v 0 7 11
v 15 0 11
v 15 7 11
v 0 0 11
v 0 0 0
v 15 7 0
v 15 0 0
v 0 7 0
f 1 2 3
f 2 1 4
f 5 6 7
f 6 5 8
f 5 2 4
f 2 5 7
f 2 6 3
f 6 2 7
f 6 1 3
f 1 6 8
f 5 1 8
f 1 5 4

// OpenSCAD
// Generated by SolidPython 1.0.1 on 2020-07-29 00:46:55


cube(size = [15, 7, 11]);
/***********************************************
*********      SolidPython code:      **********
************************************************
 
# import packages: SolidPython
from solid import *
from solid.utils import *
from itertools import chain, combinations, permutations


class Resize:

    def __init__(self, scad_file):
        self.scad_file = scad_file
        #self.scad_file = import_scad(scad_file)
        # cone/cylinder param:
        self.r1 = 0
        self.r2 = 0
        self.h = 0
        # rectangular prism param:
        self.w = 0
        self.l = 0
        # ellipse param:
        self.r = 0

    # import OpenScad code (file name corresponds to shape)


    # classify shape + parameters
    def assign(self, param1, param2, param3):
        if self.scad_file == 'cone.scad':
            self.r1 = param1
            self.r2 = param2
            self.h = param3
        elif self.scad_file == 'cylinder.scad':
            self.r1 = param1
            self.r2 = param2
            self.h = param3
        elif self.scad_file == 'rectangularPrism.scad':
            self.h = param1
            self.l = param2
            self.w = param3
        else:
            self.r = param1
            self.h = param2

    # resize parameters
    def iterate(self):
        x = range(3, 20, 2)
        i = 1
        if self.scad_file == 'cone.scad':
            tempList = list(permutations(x, 2))
            for temp in tempList:
                param1 = temp[0]
                param2 = temp[1]
                filepath = 'produced_scad_files/' + 'cone' + str(param1) + '_' + str(param2) + '_' + '.scad'
                scad_render_to_file(cylinder(h=param1, r1=param2, r2=0), filepath)

        elif self.scad_file == 'cylinder.scad':
            tempList = list(permutations(x, 3))
            for temp in tempList:
                param1 = temp[0]
                param2 = temp[1]
                filepath = 'produced_scad_files/' + 'cylinder' + str(param1) + '_' + str(param2) + '_' + '.scad'
                scad_render_to_file(cylinder(h=param1, r1=param2, r2=param2), filepath)

        elif self.scad_file == 'rectangularPrism.scad':
            tempList = list(permutations(x, 3))
            for temp in tempList:
                param1 = temp[0]
                param2 = temp[1]
                param3 = temp[2]
                filepath = 'produced_scad_files/' + 'rectangularPrism' + str(param1) + '_' + str(param2) + '_' + str(
                    param3) + '.scad'
                scad_render_to_file(cube(size=(param1, param2, param3)), filepath)

        elif self.scad_file == 'ellipse.scad':
            tempList = list(permutations(x, 4))
            for temp in tempList:
                param1 = temp[0]
                param2 = temp[1]
                param3 = temp[2]
                param4 = temp[3]
                filepath = 'produced_scad_files/' + 'ellipse' + str(param1) + '_' + str(param2) + '_' + str(param3) + '_' + str(param4) + '.scad'
                scad_render_to_file(scale([param1, param2, param3])(sphere(r=param4)), filepath)

    def render_to_scadfile(self):
        scad_render_to_file(scad, 'example.scad') 
 
************************************************/
